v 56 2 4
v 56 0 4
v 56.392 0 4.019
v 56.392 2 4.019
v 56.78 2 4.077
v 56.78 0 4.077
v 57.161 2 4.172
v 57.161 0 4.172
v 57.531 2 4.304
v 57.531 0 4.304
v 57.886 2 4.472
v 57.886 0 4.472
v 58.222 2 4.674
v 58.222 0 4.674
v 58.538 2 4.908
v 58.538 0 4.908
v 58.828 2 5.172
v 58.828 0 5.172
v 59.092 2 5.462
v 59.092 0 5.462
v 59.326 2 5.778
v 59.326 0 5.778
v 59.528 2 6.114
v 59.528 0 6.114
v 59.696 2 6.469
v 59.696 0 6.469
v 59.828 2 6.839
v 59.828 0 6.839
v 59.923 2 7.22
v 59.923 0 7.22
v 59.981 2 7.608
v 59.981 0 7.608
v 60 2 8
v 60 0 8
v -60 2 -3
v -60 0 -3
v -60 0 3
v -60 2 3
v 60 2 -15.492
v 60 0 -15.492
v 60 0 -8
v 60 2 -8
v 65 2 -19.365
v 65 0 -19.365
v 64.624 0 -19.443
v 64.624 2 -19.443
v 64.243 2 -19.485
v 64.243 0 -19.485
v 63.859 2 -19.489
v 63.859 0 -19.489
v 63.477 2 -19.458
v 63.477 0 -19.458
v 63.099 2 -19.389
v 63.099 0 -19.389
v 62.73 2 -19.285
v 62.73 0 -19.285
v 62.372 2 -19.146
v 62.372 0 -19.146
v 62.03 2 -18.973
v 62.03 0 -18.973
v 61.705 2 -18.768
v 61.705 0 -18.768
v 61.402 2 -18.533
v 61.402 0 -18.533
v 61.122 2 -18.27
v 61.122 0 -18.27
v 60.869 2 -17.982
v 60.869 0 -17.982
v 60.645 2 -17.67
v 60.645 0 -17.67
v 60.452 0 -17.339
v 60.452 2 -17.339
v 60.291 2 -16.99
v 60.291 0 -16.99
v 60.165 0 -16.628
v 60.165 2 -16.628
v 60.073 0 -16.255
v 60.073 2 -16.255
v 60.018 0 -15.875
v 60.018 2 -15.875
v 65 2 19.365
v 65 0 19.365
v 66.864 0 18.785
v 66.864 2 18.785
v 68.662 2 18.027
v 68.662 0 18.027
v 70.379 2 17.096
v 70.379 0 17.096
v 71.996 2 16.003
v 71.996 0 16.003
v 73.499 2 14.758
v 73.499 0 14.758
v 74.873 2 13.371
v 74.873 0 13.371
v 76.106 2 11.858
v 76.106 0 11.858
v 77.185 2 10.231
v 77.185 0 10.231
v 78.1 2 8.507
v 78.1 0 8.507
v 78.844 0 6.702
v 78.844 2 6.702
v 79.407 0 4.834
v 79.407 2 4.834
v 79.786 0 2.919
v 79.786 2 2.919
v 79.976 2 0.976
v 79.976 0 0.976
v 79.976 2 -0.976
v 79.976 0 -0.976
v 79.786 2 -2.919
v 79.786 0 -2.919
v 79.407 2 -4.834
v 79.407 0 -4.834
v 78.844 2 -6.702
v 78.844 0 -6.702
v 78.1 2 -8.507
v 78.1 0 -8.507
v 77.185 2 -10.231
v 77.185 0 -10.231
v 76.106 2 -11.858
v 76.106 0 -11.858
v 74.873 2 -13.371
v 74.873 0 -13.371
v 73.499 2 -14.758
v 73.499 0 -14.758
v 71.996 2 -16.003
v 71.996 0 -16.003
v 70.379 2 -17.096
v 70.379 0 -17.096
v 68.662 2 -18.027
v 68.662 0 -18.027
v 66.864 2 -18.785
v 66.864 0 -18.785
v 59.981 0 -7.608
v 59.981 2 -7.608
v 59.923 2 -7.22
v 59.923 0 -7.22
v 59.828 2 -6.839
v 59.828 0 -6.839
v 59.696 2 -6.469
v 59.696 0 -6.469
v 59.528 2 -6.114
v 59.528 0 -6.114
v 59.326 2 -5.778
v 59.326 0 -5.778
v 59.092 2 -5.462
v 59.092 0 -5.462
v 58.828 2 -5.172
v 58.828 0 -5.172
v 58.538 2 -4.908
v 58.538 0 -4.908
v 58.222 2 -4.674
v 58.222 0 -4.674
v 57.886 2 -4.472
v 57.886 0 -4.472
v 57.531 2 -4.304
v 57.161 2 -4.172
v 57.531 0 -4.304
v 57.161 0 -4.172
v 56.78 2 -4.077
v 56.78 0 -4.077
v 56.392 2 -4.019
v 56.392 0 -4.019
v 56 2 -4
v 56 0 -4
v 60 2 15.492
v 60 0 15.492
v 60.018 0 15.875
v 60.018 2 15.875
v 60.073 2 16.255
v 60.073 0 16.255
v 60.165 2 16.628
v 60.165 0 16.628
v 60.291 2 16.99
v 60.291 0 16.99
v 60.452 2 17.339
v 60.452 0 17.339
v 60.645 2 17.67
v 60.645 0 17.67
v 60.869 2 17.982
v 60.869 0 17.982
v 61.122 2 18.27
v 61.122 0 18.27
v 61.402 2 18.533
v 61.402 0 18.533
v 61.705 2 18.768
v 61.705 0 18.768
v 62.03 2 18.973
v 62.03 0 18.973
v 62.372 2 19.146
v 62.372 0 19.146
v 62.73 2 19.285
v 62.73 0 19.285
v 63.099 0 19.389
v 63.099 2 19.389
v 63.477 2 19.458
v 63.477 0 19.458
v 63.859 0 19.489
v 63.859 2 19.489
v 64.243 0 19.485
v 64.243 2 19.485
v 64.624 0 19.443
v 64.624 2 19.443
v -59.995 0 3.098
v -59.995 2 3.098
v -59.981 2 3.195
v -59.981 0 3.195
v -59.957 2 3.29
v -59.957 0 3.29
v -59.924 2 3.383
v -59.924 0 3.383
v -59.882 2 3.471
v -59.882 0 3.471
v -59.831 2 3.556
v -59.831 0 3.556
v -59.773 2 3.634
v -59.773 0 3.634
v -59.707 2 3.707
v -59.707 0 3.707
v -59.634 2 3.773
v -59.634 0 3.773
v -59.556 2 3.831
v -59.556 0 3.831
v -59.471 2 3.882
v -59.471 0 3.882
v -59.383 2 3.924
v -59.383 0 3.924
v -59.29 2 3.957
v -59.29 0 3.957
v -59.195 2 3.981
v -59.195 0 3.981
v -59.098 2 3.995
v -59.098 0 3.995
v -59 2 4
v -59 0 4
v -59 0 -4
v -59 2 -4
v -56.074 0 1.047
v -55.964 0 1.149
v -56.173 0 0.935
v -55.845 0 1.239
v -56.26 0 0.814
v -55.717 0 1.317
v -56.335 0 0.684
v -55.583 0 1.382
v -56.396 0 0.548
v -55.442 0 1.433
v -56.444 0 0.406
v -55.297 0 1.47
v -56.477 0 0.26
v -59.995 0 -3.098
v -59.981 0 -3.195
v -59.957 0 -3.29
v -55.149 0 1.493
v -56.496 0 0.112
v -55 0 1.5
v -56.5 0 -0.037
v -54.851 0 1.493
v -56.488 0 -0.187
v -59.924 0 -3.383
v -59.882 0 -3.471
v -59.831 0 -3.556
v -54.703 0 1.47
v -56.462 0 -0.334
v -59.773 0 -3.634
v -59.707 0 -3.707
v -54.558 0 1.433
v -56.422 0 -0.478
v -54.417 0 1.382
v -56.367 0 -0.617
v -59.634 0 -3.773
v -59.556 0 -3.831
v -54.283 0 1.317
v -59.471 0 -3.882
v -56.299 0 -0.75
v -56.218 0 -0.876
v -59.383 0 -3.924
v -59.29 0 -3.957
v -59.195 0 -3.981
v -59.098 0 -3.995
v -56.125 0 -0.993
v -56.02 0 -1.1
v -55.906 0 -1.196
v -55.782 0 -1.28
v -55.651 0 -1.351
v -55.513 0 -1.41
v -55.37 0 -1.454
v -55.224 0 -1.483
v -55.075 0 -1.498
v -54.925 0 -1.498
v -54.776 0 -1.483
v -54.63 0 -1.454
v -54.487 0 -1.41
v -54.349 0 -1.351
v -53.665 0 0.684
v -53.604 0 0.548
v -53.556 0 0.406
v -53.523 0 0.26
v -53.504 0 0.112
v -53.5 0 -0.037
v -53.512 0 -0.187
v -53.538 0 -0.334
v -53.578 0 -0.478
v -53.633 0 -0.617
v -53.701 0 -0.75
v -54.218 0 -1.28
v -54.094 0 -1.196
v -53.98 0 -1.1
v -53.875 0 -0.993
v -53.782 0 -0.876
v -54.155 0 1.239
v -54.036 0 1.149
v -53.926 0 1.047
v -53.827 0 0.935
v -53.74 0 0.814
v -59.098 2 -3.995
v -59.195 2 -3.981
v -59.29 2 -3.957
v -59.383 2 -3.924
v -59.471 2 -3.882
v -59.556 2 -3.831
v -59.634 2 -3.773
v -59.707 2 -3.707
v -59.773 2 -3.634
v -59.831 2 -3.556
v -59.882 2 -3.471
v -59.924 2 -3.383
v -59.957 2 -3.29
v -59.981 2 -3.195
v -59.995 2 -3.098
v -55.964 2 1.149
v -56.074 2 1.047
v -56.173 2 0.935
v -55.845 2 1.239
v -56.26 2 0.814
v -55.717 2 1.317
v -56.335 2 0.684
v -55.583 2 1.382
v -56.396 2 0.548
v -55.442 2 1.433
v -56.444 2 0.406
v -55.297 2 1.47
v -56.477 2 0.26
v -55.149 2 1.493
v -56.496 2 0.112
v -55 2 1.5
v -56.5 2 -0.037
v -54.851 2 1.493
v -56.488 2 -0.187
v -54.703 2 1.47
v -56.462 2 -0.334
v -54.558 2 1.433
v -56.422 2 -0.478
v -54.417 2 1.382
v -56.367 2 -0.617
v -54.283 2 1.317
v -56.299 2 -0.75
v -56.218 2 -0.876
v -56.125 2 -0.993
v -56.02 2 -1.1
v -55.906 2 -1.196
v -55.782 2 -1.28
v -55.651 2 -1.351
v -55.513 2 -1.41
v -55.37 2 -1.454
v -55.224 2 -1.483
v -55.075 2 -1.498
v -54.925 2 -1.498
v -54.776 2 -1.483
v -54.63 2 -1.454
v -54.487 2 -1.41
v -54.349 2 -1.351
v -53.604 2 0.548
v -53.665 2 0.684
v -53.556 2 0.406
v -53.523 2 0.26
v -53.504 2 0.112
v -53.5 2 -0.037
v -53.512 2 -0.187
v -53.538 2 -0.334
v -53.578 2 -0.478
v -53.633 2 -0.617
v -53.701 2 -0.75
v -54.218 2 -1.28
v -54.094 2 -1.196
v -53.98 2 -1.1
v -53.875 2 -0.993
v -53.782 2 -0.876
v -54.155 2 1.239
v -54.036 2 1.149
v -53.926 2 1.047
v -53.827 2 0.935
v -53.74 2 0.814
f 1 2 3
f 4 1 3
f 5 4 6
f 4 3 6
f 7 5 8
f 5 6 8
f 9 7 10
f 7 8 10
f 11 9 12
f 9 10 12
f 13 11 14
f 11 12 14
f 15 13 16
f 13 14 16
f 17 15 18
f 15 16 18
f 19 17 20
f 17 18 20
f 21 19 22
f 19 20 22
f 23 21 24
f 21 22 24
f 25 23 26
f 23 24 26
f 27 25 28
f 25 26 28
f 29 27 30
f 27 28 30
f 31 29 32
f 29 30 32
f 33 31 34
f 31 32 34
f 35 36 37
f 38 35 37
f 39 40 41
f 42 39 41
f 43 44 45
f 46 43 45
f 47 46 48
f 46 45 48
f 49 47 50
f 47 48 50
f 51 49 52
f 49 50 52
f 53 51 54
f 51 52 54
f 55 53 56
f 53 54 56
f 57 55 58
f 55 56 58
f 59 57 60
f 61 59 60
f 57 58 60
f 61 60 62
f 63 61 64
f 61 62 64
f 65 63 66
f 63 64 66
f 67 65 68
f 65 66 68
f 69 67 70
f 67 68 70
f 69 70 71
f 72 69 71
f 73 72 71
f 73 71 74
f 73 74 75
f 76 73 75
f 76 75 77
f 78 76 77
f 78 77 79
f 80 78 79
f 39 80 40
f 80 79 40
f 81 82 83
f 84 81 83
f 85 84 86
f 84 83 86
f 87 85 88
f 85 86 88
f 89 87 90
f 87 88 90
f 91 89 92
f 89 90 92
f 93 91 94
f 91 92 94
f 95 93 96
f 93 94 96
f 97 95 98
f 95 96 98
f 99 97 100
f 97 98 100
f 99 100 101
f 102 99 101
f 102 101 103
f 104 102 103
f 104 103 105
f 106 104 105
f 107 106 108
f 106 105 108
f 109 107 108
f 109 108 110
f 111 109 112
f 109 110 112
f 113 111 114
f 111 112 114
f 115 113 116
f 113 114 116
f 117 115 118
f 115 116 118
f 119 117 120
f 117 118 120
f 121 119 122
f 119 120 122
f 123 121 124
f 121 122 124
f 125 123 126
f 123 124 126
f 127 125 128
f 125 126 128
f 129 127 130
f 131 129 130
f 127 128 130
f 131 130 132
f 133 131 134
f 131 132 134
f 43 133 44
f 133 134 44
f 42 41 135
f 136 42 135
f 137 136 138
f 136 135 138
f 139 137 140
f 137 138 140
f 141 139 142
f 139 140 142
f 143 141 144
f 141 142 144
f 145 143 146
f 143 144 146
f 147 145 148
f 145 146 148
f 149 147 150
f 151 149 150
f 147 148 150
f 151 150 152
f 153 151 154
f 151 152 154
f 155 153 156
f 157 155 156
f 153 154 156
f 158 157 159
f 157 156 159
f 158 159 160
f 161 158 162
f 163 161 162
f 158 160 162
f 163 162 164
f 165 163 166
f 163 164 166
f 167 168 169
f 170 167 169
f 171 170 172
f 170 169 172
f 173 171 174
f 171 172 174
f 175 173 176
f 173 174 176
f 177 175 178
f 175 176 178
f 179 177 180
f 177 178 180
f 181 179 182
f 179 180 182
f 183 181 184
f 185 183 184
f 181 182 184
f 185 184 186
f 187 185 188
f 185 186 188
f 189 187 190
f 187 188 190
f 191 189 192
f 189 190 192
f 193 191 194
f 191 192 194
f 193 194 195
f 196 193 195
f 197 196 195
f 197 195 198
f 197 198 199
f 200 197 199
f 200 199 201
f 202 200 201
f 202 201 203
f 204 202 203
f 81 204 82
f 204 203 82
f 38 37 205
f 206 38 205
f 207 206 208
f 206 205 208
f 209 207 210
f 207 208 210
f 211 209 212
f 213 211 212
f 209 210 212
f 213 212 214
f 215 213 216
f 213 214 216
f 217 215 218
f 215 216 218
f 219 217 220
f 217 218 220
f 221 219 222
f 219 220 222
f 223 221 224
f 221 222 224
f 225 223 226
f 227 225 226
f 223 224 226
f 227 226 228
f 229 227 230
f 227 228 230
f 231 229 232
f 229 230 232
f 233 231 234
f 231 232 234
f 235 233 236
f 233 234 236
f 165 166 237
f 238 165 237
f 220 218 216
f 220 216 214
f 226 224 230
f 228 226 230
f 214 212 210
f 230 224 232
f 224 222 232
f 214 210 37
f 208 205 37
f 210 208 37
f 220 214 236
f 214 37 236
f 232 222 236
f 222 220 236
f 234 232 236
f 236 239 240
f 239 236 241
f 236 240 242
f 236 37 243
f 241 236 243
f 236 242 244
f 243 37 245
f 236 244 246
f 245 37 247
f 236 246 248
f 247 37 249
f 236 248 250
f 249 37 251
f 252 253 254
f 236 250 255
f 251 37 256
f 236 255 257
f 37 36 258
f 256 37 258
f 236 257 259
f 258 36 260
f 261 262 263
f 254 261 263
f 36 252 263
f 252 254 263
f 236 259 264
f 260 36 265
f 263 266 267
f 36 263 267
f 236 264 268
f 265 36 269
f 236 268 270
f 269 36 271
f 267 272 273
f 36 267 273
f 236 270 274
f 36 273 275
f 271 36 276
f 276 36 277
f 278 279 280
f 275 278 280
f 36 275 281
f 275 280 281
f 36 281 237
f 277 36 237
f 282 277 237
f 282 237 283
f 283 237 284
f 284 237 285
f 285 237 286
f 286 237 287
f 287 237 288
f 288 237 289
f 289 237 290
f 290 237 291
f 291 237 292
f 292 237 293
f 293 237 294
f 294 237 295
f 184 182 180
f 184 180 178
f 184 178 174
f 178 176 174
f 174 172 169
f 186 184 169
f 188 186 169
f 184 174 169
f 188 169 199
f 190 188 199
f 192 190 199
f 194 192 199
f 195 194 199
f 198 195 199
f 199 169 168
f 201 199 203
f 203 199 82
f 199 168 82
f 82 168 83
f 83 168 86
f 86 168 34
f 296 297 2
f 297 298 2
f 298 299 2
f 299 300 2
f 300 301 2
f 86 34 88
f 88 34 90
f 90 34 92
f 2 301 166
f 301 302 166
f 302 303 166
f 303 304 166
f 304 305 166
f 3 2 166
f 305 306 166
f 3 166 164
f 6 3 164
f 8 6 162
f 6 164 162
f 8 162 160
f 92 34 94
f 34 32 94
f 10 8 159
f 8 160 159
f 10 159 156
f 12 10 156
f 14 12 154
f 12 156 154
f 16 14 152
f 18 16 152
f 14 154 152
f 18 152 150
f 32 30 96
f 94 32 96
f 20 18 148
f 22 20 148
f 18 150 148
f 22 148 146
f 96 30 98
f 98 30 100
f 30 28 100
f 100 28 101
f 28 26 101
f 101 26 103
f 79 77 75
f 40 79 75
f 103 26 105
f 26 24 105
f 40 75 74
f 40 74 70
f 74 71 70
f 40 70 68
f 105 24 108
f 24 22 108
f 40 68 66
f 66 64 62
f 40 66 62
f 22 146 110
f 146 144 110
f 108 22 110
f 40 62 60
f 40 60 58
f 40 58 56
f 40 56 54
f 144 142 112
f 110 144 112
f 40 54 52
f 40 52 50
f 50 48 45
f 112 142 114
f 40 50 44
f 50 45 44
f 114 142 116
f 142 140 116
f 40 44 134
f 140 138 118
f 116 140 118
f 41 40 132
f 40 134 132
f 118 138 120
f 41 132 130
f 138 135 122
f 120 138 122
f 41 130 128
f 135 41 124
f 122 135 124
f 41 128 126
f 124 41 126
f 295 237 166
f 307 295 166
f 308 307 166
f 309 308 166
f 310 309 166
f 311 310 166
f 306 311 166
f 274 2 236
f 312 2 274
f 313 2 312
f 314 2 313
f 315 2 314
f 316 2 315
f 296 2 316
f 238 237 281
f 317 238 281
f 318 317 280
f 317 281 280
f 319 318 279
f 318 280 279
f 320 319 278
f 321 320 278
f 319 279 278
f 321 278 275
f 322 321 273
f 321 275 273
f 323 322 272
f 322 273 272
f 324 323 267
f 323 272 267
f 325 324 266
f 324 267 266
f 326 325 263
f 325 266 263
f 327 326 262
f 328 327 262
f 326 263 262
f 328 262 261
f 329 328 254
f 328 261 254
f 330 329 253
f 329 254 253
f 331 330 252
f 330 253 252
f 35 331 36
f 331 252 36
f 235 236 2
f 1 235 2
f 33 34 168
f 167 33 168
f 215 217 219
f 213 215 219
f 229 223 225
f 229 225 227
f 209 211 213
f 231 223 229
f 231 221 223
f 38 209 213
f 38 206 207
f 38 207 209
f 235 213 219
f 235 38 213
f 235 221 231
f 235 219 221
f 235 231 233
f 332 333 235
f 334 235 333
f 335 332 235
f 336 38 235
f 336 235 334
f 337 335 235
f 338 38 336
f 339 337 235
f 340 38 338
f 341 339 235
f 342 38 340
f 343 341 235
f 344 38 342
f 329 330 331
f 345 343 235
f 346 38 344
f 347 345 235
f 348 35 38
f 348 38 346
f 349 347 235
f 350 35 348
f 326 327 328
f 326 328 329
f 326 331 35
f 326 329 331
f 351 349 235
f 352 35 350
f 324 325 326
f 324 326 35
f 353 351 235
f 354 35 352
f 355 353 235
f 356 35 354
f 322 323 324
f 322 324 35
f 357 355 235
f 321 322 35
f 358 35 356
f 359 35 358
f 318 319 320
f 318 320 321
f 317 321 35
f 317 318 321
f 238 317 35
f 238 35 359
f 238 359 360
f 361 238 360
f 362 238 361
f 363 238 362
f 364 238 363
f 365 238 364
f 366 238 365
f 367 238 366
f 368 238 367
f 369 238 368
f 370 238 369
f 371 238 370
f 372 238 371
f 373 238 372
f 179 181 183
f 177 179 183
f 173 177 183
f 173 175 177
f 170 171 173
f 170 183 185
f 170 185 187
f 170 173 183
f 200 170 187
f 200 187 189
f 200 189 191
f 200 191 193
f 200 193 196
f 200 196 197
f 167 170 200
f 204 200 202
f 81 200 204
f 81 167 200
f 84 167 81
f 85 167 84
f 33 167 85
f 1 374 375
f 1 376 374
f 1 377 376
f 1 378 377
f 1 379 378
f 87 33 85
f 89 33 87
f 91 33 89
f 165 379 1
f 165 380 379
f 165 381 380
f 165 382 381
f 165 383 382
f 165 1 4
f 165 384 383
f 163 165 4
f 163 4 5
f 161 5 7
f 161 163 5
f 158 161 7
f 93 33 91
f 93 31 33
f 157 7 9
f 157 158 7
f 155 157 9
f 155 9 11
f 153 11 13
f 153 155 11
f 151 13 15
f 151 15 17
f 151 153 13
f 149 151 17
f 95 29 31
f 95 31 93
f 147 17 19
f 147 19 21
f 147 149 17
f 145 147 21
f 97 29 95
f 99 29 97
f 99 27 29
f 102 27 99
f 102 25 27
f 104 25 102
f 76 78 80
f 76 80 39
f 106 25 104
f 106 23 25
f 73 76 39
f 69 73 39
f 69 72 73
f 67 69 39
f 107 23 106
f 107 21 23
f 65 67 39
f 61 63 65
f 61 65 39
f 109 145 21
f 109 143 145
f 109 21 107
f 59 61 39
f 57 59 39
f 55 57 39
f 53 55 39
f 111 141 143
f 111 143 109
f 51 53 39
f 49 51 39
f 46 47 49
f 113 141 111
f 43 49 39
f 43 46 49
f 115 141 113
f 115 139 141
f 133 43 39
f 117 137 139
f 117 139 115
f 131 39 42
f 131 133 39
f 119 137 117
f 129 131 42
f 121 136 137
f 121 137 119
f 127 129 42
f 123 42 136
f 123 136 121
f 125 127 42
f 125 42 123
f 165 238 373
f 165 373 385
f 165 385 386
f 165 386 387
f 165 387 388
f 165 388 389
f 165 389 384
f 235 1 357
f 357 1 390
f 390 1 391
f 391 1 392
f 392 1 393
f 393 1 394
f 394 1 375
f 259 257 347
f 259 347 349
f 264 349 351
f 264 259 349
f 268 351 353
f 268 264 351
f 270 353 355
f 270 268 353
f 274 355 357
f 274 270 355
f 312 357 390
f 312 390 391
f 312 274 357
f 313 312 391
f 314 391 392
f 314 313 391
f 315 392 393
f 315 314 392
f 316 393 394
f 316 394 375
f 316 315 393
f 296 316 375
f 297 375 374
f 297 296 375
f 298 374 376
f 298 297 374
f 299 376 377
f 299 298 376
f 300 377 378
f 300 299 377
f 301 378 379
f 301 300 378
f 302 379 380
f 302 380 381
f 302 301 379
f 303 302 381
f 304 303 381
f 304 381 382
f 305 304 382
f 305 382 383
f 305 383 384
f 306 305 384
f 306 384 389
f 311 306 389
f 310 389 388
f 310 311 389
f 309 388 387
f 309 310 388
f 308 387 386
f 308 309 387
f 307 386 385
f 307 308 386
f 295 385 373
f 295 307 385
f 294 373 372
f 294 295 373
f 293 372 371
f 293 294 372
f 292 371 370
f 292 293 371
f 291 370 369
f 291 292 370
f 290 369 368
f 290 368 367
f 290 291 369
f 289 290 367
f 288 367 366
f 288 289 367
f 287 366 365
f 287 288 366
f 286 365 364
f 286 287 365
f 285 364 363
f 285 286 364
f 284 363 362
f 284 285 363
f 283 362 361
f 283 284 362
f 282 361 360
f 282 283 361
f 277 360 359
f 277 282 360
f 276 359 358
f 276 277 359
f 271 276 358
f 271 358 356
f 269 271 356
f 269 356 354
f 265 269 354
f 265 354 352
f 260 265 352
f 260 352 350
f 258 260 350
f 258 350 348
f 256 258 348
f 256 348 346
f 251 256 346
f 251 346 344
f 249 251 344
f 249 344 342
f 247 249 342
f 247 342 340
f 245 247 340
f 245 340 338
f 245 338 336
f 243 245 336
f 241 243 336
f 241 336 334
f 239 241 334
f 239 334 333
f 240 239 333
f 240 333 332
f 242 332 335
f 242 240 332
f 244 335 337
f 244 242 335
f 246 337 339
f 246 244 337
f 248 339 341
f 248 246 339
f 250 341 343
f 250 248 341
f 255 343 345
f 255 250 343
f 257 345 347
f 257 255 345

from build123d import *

# Parameters (mm, degrees)
SKETCH1_R           = 1.5
BOSS_EXTRUDE1_DEPTH = 2


with BuildPart() as part:
    # Sketch1 → Boss-Extrude1 (new body)
    with BuildSketch(Plane(origin=(0, 0, 0), x_dir=(1, 0, 0), z_dir=(0, 1, 0))):
        with BuildLine():
            Line((60, 15.491933385), (60, 8))
            ThreePointArc((60, 8), (58.828427125, 5.171572875), (56, 4))
            Line((56, 4), (-59, 4))
            ThreePointArc((-59, 4), (-59.707106781, 3.707106781), (-60, 3))
            Line((-60, 3), (-60, -3))
            ThreePointArc((-60, -3), (-59.707106781, -3.707106781), (-59, -4))
            Line((-59, -4), (56, -4))
            ThreePointArc((56, -4), (58.828427125, -5.171572875), (60, -8))
            Line((60, -8), (60, -15.491933385))
            ThreePointArc((60, -15.491933385), (61.550510257, -18.654211045), (65, -19.364916731))
            ThreePointArc((65, -19.364916731), (80, 0), (65, 19.364916731))
            ThreePointArc((65, 19.364916731), (61.550510257, 18.654211045), (60, 15.491933385))
        make_face()
        with Locations(Location((-55, 0, 0), (0, 0, 270))):
            Circle(SKETCH1_R, mode=Mode.SUBTRACT)
    extrude(amount=BOSS_EXTRUDE1_DEPTH)


solid = part.part
